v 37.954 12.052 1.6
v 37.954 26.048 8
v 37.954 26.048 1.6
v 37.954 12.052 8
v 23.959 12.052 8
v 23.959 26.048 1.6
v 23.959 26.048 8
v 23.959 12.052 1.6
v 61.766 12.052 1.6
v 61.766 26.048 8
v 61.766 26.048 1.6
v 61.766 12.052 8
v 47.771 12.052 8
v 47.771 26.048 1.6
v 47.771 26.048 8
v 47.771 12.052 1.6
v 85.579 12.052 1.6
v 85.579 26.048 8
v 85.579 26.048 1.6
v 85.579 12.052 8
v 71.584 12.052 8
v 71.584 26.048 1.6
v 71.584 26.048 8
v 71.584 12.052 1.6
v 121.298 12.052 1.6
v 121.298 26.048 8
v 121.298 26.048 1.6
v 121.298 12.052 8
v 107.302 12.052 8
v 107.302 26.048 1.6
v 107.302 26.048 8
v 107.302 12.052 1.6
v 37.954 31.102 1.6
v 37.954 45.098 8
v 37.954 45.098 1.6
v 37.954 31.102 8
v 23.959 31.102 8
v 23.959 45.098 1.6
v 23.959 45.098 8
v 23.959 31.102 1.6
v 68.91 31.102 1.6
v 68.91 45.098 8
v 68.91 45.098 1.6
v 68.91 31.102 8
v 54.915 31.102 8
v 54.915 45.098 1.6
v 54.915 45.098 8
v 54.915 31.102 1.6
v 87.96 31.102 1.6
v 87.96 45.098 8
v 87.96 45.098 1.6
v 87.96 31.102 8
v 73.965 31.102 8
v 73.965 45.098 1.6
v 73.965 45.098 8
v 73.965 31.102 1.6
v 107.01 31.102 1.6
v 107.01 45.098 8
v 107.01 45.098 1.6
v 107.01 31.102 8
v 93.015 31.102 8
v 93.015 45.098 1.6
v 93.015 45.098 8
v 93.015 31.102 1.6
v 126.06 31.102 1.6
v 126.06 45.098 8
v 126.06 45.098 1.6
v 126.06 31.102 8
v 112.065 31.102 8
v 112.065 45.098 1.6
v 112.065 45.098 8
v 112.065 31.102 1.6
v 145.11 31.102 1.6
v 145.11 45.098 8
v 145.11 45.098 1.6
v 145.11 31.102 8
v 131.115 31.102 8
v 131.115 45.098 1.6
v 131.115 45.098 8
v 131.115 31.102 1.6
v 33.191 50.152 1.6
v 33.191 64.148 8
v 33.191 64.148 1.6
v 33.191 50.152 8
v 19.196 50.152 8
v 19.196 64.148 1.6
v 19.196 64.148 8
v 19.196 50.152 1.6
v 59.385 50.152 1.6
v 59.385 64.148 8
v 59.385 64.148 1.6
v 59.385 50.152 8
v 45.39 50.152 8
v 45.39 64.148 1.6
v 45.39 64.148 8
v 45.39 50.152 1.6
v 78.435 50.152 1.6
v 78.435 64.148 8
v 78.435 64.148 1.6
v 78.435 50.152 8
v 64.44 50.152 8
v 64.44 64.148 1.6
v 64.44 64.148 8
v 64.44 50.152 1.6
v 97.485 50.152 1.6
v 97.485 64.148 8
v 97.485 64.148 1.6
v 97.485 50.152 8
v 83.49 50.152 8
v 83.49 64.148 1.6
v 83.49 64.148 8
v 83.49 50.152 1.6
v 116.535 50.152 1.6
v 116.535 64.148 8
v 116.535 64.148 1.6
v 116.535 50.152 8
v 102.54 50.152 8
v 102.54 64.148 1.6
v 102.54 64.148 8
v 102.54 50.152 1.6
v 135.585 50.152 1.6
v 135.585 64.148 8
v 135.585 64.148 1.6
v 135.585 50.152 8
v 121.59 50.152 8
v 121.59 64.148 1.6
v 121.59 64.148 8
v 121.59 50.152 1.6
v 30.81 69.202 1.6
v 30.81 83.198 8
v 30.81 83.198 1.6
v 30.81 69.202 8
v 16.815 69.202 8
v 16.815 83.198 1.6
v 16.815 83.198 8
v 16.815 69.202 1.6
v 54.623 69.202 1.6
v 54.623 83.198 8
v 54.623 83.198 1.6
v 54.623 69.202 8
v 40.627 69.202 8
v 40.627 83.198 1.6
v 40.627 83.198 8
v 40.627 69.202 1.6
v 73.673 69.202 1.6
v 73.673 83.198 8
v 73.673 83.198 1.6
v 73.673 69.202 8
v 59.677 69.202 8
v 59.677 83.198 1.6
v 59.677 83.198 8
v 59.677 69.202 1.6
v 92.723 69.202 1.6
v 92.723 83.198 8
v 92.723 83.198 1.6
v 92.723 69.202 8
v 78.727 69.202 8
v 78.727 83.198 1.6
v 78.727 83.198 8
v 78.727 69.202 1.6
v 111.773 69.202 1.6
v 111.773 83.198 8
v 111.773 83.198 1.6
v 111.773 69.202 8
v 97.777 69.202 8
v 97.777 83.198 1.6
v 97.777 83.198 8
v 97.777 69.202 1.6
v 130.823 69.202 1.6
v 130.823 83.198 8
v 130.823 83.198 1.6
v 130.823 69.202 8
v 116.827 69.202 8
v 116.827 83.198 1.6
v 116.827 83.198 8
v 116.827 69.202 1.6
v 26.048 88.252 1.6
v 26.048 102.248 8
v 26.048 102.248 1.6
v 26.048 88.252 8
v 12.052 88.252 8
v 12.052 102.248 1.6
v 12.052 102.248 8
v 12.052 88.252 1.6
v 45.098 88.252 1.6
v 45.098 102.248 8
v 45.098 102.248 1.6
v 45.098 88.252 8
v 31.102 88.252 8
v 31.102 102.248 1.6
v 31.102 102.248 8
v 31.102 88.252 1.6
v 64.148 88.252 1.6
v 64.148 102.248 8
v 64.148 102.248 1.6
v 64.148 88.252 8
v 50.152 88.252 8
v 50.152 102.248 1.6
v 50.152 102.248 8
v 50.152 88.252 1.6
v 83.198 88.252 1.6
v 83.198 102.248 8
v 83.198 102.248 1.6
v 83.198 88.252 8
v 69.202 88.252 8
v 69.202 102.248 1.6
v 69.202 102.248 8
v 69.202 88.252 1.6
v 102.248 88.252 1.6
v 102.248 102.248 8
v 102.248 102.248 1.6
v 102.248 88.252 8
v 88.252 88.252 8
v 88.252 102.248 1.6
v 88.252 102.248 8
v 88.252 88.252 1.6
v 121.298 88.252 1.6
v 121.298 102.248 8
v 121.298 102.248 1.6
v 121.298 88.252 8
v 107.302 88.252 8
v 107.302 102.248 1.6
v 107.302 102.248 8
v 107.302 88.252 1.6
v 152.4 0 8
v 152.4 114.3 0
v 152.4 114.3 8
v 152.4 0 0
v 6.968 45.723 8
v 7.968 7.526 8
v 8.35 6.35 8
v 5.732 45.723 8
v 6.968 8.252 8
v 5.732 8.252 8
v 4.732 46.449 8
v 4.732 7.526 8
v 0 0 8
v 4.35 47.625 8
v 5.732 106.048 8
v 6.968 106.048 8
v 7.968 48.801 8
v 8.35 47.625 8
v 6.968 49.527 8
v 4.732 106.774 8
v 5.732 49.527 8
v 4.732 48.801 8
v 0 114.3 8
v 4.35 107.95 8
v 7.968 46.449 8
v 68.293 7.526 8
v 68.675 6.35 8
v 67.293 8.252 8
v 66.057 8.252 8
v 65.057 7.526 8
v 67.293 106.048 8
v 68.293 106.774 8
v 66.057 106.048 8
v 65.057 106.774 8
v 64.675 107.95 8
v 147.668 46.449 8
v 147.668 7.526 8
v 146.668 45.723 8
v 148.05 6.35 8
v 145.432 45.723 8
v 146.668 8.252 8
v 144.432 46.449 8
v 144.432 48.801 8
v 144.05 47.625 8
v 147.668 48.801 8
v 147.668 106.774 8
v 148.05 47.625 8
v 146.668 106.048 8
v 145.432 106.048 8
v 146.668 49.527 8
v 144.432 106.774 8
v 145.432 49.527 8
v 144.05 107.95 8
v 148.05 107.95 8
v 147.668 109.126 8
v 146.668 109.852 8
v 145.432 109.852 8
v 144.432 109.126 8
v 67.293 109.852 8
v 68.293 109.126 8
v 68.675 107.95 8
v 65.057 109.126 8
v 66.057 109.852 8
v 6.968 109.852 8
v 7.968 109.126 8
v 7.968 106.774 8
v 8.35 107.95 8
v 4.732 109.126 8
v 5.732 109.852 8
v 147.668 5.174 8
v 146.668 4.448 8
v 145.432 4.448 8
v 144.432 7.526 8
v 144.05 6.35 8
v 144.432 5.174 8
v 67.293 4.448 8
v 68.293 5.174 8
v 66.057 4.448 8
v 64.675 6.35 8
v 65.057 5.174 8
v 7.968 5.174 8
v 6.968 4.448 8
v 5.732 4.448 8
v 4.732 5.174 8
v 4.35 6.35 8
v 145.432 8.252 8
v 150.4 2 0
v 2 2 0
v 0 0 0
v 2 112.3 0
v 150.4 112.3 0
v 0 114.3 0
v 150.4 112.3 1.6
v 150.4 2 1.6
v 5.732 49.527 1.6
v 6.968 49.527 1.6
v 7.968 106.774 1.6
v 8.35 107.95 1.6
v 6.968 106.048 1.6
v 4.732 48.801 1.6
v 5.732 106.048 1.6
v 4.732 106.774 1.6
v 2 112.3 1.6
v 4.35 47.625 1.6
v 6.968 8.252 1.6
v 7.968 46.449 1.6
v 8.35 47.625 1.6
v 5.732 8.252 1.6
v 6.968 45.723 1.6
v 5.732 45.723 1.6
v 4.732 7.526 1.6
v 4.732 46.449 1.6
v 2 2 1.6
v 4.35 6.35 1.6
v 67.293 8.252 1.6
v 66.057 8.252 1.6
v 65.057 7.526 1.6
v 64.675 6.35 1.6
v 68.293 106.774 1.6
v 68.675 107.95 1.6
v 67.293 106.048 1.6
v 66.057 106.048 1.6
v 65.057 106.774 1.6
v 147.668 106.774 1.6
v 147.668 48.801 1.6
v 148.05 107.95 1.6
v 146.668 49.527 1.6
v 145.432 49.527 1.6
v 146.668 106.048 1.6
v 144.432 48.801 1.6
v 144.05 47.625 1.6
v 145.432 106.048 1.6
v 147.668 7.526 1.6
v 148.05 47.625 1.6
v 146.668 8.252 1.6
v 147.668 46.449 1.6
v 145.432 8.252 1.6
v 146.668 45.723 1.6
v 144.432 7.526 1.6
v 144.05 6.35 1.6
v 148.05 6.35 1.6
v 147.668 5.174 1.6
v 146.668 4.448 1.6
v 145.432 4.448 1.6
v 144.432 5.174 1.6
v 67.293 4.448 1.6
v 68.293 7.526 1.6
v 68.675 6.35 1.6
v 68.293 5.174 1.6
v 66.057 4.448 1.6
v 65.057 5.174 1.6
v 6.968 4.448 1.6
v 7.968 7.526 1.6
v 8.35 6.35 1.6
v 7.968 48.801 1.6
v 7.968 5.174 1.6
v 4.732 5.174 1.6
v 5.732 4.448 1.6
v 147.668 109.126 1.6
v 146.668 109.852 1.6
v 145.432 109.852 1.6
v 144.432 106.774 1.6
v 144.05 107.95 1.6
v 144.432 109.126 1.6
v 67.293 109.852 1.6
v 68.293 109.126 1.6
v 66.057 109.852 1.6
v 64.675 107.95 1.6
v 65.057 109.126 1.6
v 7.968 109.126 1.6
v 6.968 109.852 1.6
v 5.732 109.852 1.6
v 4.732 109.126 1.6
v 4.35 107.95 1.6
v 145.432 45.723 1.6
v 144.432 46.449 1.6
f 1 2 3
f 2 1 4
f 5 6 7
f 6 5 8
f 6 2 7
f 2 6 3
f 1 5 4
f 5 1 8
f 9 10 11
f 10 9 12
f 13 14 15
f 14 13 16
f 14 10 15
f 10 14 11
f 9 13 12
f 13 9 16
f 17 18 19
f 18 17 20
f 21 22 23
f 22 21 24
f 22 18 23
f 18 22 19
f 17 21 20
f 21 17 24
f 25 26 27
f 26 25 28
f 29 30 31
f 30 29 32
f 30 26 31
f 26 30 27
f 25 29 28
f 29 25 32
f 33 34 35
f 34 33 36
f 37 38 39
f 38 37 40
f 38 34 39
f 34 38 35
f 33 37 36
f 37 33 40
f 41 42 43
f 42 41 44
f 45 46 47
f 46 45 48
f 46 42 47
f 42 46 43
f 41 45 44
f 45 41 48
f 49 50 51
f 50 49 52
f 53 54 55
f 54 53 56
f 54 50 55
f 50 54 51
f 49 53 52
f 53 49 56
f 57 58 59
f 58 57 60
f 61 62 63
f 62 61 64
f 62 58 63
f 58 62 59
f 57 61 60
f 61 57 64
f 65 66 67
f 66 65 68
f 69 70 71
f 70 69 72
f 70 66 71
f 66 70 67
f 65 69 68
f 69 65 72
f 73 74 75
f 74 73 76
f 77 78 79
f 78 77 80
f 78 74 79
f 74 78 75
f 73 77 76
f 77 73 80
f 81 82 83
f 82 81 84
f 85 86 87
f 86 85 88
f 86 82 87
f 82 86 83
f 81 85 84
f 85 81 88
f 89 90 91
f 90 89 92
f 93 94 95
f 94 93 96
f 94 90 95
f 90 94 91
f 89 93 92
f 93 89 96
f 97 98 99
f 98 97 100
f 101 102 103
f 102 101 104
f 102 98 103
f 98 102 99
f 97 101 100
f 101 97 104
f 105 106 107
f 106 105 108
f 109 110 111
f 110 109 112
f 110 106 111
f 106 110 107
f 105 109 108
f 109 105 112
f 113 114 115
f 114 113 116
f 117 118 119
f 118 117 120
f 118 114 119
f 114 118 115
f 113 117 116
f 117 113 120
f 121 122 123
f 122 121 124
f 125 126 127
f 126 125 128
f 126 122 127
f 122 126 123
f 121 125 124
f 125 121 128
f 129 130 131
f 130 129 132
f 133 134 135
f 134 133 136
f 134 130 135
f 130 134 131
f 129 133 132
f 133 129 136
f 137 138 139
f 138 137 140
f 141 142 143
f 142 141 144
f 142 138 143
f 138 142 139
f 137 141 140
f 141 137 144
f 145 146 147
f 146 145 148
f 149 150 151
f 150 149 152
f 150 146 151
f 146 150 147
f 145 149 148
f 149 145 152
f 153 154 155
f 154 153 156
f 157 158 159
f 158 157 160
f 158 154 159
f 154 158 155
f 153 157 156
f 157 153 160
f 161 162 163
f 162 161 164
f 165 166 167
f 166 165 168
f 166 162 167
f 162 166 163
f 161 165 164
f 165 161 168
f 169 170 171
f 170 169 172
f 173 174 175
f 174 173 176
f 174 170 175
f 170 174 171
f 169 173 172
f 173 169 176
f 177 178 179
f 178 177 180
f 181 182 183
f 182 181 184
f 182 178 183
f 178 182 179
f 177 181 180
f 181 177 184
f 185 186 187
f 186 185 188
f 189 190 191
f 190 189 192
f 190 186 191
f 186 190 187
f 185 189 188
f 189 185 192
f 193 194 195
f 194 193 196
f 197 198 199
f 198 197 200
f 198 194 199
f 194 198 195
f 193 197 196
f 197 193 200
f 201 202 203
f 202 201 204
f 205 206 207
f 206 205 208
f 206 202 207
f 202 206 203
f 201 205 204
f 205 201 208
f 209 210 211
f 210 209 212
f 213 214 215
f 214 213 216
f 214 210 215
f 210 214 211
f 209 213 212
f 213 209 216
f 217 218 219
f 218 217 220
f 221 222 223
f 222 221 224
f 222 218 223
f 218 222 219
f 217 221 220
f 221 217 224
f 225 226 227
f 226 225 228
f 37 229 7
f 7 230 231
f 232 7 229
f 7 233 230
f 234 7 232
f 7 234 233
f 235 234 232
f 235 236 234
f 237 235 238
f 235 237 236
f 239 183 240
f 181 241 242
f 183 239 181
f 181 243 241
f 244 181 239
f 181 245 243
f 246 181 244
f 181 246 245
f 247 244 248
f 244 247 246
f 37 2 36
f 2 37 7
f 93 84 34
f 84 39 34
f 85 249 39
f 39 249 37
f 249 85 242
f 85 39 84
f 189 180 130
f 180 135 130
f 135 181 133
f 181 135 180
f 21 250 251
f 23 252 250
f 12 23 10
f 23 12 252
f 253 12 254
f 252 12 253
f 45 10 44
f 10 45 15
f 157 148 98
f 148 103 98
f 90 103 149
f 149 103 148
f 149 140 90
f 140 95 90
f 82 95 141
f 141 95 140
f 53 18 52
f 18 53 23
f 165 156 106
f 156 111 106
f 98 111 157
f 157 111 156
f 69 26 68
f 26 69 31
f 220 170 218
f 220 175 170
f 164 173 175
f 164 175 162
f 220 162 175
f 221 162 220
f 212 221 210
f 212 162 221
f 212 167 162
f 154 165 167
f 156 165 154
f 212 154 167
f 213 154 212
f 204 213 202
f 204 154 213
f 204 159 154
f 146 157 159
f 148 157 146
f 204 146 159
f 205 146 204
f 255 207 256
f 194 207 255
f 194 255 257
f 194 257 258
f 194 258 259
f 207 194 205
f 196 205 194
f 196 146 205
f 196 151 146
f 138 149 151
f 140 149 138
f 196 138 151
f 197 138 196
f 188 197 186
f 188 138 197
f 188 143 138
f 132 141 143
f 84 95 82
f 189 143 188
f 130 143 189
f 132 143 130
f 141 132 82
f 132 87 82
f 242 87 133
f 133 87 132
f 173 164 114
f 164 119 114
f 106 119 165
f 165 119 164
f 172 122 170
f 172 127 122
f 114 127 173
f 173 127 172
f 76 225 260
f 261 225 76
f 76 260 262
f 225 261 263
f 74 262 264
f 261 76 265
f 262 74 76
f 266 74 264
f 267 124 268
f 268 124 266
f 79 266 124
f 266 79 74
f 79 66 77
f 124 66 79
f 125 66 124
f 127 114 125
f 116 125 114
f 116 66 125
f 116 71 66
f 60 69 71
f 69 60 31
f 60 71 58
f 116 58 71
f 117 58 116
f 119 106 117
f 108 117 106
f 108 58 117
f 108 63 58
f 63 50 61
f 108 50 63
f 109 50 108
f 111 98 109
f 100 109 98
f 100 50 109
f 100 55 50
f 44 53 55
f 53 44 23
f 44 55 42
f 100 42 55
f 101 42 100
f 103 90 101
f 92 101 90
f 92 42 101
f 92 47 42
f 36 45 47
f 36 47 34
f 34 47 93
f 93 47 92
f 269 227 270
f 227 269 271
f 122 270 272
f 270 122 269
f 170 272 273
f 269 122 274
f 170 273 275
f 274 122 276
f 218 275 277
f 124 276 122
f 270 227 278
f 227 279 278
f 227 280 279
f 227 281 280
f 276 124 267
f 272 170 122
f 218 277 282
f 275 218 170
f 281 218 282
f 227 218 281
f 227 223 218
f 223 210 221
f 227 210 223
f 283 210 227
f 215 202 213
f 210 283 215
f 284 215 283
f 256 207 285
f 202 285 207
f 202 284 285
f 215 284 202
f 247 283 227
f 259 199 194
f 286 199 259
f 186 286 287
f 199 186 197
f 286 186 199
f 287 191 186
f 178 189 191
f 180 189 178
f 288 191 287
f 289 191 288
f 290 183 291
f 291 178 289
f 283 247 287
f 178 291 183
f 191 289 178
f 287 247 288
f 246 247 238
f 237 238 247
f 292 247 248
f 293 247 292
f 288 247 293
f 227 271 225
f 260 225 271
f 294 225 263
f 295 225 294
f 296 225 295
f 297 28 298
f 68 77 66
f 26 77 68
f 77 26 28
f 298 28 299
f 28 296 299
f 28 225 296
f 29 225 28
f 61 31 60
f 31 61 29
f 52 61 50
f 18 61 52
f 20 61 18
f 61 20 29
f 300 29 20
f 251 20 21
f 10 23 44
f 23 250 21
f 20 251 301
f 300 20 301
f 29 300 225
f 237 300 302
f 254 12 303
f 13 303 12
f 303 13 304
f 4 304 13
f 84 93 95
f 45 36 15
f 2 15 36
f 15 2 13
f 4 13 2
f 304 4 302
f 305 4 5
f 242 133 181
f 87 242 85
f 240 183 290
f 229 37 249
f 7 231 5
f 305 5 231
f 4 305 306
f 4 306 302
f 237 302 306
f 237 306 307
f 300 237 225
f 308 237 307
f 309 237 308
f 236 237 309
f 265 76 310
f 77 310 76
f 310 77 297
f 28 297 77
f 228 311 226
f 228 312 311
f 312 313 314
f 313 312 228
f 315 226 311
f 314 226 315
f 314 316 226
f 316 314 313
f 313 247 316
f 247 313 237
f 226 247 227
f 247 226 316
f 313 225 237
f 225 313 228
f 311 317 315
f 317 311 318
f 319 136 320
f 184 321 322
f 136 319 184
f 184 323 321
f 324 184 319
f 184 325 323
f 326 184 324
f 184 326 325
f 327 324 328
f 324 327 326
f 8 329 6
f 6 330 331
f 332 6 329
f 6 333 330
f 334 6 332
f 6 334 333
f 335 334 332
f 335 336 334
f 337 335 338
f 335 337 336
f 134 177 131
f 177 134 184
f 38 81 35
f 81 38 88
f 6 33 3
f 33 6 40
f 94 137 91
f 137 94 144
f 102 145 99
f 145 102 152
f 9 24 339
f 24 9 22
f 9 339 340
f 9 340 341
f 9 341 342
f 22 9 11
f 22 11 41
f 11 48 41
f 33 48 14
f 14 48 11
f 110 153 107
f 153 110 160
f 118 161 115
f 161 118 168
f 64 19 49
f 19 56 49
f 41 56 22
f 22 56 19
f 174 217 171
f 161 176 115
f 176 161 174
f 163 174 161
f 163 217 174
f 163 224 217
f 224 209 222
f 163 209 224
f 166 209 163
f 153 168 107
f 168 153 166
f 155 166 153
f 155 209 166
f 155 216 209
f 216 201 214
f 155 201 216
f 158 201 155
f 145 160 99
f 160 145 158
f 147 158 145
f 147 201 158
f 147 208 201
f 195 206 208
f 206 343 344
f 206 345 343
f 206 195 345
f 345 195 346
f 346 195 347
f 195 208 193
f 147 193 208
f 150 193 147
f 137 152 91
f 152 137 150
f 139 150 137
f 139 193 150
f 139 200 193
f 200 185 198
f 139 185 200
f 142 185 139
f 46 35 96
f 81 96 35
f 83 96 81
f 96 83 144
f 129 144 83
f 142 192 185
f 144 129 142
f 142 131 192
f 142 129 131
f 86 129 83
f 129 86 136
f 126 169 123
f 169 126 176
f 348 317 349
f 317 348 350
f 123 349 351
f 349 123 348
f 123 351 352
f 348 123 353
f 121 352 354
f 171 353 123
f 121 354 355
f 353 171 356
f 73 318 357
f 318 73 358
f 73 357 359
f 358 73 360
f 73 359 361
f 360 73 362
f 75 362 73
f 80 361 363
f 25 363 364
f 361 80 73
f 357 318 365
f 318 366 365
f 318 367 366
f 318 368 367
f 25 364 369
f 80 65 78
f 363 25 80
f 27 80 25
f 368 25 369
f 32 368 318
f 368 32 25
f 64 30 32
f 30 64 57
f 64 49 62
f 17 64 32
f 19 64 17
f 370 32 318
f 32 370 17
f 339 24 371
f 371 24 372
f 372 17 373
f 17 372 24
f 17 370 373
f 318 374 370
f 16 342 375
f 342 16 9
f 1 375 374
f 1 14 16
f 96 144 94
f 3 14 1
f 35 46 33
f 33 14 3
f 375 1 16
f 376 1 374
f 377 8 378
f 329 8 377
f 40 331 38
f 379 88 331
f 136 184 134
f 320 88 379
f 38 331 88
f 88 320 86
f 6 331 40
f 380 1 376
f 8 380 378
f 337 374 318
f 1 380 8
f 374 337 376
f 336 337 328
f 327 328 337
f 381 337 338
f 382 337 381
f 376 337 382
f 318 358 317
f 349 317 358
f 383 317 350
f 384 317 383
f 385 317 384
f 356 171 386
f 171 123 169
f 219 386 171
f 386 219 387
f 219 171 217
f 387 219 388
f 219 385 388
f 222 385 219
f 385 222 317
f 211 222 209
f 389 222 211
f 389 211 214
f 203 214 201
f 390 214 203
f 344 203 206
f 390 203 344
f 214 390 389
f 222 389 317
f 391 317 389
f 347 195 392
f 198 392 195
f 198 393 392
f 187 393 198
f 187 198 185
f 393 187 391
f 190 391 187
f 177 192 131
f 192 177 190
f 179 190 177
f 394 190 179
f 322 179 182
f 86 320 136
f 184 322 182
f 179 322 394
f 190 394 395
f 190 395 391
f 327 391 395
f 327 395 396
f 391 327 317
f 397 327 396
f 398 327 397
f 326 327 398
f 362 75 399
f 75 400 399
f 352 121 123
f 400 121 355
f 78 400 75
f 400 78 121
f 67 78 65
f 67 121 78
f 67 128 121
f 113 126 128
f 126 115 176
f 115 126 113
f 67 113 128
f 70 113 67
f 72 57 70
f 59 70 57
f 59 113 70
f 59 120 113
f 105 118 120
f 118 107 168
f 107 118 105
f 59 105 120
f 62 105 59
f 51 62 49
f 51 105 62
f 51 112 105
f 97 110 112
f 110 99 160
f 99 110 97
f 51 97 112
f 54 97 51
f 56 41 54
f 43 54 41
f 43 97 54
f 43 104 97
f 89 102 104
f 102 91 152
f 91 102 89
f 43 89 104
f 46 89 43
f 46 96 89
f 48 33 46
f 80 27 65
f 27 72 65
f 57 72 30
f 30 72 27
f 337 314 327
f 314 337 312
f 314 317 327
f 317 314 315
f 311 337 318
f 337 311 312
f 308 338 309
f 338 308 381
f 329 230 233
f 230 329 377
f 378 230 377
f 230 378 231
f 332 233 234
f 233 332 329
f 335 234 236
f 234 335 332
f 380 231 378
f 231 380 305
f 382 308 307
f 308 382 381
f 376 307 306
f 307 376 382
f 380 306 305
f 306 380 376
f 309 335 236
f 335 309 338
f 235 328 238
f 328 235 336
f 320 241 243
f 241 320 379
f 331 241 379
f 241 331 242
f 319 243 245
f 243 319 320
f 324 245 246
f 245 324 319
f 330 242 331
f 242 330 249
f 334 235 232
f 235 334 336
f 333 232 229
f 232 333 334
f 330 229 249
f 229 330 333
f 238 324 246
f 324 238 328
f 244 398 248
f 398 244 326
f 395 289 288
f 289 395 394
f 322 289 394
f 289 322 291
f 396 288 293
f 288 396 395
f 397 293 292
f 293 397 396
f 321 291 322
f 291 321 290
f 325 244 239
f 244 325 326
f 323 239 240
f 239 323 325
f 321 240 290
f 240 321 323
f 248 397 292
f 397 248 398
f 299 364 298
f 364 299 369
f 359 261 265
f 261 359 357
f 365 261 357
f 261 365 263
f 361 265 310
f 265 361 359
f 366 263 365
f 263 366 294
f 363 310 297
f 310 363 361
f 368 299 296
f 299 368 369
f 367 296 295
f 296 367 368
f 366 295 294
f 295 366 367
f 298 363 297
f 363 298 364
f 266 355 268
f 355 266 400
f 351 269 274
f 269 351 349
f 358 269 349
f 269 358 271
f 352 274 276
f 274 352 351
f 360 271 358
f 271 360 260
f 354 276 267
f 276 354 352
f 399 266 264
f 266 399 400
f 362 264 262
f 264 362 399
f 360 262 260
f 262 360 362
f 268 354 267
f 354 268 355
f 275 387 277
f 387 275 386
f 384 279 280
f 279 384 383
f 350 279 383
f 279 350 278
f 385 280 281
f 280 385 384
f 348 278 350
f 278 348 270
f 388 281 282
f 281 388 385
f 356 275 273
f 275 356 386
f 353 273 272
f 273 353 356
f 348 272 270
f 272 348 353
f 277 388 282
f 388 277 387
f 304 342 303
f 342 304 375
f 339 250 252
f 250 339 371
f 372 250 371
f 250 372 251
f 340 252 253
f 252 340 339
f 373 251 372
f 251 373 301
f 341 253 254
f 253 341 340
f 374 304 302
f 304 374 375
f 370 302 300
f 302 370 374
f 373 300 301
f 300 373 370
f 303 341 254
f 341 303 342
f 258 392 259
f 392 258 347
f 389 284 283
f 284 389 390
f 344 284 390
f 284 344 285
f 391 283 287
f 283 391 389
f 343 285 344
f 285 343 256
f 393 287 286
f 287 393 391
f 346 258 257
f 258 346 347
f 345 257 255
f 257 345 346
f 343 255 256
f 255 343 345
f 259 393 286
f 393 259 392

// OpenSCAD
/*
OpenSCAD script to make a keyboard top frame.
The design is written for 3D printing.
*/

K=25.4;
U = 0.75*K; // standard key spacing

// list of key locations
keys = [
    // 0
    [
        [1*U+K*15/32, 1*U],
        [1*U+K*15/32+1*K*15/16, 1*U],
        [1*U+K*15/32+2*K*15/16, 1*U],
        [6*U, 1*U]
    ],
    // 1
    [
        [0.25*U+0.375*U+1*U, 2*U],
        [0.5*U+0.750*U+2*U, 2*U],
        [0.5*U+0.750*U+3*U, 2*U],
        [0.5*U+0.750*U+4*U, 2*U],
        [0.5*U+0.750*U+5*U, 2*U],
        [0.5*U+0.750*U+6*U, 2*U]
    ],
    // 2
    [
        [0.375*U+1*U, 3*U],
        [0.750*U+2*U, 3*U],
        [0.750*U+3*U, 3*U],
        [0.750*U+4*U, 3*U],
        [0.750*U+5*U, 3*U],
        [0.750*U+6*U, 3*U]
    ],
    // 3
    [
        [0.250*U+1*U, 4*U],
        [0.500*U+2*U, 4*U],
        [0.500*U+3*U, 4*U],
        [0.500*U+4*U, 4*U],
        [0.500*U+5*U, 4*U],
        [0.500*U+6*U, 4*U]
    ],
    // 4
    [
        [1*U, 5*U],
        [2*U, 5*U],
        [3*U, 5*U],
        [4*U, 5*U],
        [5*U, 5*U],
        [6*U, 5*U]
    ]
];

Ncol = 6; 
Nrow = 5;

$width = 8*U;
$height = (1+Nrow)*U;
$depth = 8.0;

$w_ridge = 2.0;
$d_ridge = 0.063*25.4;

$cutout_size = 0.551*25.4; // dimension of of square key cutouts
$mtg = 2.0; // mounting hole diameter

$vpr = [0, 0, 0]; // viewing angle
$vpd = 30*U; // viewing distance
$vpt = [$width/2, $height/2, 10];
$fn = 10; // number of segments in a circle

// here we create a slab and subtract from it.
difference() {
    
    // the slab
    color([0.0,0.3,0.5]) cube([$width, $height, $depth]);
    
    // make the key switch cutouts
    for (row = [0:len(keys)-1]) {
        for (col = [0:len(keys[row])-1]) {
            translate(concat(keys[row][col], [0.0])) cube(size=[$cutout_size, $cutout_size, 20], center=true);
        }
    }
    
    // remove some depth fromt he bottom, leaving a ridge around the outside.
    translate([$w_ridge, $w_ridge, $d_ridge-$depth]) cube(size=[$width-2*$w_ridge, $height-2*$w_ridge, $depth]);
    
    // make some mounting holes
    translate([U/3, U/3, 0.0])                    cylinder(20, r=$mtg, center=true);
    translate([U/3, 2.5*U, 0.0])                  cylinder(20, r=$mtg, center=true);
    translate([U/3, $height-U/3, 0.0])            cylinder(20, r=$mtg, center=true);
    translate([$width-U/3, U/3, 0.0])             cylinder(20, r=$mtg, center=true);
    translate([$width-U/3, 2.5*U, 0.0])           cylinder(20, r=$mtg, center=true);
    translate([$width -U/3, $height-U/3, 0.0])    cylinder(20, r=$mtg, center=true);    
    translate([3.5*U, U/3, 0.0])                  cylinder(20, r=$mtg, center=true);
    translate([3.5*U, $height-U/3, 0.0])          cylinder(20, r=$mtg, center=true);
    
}
